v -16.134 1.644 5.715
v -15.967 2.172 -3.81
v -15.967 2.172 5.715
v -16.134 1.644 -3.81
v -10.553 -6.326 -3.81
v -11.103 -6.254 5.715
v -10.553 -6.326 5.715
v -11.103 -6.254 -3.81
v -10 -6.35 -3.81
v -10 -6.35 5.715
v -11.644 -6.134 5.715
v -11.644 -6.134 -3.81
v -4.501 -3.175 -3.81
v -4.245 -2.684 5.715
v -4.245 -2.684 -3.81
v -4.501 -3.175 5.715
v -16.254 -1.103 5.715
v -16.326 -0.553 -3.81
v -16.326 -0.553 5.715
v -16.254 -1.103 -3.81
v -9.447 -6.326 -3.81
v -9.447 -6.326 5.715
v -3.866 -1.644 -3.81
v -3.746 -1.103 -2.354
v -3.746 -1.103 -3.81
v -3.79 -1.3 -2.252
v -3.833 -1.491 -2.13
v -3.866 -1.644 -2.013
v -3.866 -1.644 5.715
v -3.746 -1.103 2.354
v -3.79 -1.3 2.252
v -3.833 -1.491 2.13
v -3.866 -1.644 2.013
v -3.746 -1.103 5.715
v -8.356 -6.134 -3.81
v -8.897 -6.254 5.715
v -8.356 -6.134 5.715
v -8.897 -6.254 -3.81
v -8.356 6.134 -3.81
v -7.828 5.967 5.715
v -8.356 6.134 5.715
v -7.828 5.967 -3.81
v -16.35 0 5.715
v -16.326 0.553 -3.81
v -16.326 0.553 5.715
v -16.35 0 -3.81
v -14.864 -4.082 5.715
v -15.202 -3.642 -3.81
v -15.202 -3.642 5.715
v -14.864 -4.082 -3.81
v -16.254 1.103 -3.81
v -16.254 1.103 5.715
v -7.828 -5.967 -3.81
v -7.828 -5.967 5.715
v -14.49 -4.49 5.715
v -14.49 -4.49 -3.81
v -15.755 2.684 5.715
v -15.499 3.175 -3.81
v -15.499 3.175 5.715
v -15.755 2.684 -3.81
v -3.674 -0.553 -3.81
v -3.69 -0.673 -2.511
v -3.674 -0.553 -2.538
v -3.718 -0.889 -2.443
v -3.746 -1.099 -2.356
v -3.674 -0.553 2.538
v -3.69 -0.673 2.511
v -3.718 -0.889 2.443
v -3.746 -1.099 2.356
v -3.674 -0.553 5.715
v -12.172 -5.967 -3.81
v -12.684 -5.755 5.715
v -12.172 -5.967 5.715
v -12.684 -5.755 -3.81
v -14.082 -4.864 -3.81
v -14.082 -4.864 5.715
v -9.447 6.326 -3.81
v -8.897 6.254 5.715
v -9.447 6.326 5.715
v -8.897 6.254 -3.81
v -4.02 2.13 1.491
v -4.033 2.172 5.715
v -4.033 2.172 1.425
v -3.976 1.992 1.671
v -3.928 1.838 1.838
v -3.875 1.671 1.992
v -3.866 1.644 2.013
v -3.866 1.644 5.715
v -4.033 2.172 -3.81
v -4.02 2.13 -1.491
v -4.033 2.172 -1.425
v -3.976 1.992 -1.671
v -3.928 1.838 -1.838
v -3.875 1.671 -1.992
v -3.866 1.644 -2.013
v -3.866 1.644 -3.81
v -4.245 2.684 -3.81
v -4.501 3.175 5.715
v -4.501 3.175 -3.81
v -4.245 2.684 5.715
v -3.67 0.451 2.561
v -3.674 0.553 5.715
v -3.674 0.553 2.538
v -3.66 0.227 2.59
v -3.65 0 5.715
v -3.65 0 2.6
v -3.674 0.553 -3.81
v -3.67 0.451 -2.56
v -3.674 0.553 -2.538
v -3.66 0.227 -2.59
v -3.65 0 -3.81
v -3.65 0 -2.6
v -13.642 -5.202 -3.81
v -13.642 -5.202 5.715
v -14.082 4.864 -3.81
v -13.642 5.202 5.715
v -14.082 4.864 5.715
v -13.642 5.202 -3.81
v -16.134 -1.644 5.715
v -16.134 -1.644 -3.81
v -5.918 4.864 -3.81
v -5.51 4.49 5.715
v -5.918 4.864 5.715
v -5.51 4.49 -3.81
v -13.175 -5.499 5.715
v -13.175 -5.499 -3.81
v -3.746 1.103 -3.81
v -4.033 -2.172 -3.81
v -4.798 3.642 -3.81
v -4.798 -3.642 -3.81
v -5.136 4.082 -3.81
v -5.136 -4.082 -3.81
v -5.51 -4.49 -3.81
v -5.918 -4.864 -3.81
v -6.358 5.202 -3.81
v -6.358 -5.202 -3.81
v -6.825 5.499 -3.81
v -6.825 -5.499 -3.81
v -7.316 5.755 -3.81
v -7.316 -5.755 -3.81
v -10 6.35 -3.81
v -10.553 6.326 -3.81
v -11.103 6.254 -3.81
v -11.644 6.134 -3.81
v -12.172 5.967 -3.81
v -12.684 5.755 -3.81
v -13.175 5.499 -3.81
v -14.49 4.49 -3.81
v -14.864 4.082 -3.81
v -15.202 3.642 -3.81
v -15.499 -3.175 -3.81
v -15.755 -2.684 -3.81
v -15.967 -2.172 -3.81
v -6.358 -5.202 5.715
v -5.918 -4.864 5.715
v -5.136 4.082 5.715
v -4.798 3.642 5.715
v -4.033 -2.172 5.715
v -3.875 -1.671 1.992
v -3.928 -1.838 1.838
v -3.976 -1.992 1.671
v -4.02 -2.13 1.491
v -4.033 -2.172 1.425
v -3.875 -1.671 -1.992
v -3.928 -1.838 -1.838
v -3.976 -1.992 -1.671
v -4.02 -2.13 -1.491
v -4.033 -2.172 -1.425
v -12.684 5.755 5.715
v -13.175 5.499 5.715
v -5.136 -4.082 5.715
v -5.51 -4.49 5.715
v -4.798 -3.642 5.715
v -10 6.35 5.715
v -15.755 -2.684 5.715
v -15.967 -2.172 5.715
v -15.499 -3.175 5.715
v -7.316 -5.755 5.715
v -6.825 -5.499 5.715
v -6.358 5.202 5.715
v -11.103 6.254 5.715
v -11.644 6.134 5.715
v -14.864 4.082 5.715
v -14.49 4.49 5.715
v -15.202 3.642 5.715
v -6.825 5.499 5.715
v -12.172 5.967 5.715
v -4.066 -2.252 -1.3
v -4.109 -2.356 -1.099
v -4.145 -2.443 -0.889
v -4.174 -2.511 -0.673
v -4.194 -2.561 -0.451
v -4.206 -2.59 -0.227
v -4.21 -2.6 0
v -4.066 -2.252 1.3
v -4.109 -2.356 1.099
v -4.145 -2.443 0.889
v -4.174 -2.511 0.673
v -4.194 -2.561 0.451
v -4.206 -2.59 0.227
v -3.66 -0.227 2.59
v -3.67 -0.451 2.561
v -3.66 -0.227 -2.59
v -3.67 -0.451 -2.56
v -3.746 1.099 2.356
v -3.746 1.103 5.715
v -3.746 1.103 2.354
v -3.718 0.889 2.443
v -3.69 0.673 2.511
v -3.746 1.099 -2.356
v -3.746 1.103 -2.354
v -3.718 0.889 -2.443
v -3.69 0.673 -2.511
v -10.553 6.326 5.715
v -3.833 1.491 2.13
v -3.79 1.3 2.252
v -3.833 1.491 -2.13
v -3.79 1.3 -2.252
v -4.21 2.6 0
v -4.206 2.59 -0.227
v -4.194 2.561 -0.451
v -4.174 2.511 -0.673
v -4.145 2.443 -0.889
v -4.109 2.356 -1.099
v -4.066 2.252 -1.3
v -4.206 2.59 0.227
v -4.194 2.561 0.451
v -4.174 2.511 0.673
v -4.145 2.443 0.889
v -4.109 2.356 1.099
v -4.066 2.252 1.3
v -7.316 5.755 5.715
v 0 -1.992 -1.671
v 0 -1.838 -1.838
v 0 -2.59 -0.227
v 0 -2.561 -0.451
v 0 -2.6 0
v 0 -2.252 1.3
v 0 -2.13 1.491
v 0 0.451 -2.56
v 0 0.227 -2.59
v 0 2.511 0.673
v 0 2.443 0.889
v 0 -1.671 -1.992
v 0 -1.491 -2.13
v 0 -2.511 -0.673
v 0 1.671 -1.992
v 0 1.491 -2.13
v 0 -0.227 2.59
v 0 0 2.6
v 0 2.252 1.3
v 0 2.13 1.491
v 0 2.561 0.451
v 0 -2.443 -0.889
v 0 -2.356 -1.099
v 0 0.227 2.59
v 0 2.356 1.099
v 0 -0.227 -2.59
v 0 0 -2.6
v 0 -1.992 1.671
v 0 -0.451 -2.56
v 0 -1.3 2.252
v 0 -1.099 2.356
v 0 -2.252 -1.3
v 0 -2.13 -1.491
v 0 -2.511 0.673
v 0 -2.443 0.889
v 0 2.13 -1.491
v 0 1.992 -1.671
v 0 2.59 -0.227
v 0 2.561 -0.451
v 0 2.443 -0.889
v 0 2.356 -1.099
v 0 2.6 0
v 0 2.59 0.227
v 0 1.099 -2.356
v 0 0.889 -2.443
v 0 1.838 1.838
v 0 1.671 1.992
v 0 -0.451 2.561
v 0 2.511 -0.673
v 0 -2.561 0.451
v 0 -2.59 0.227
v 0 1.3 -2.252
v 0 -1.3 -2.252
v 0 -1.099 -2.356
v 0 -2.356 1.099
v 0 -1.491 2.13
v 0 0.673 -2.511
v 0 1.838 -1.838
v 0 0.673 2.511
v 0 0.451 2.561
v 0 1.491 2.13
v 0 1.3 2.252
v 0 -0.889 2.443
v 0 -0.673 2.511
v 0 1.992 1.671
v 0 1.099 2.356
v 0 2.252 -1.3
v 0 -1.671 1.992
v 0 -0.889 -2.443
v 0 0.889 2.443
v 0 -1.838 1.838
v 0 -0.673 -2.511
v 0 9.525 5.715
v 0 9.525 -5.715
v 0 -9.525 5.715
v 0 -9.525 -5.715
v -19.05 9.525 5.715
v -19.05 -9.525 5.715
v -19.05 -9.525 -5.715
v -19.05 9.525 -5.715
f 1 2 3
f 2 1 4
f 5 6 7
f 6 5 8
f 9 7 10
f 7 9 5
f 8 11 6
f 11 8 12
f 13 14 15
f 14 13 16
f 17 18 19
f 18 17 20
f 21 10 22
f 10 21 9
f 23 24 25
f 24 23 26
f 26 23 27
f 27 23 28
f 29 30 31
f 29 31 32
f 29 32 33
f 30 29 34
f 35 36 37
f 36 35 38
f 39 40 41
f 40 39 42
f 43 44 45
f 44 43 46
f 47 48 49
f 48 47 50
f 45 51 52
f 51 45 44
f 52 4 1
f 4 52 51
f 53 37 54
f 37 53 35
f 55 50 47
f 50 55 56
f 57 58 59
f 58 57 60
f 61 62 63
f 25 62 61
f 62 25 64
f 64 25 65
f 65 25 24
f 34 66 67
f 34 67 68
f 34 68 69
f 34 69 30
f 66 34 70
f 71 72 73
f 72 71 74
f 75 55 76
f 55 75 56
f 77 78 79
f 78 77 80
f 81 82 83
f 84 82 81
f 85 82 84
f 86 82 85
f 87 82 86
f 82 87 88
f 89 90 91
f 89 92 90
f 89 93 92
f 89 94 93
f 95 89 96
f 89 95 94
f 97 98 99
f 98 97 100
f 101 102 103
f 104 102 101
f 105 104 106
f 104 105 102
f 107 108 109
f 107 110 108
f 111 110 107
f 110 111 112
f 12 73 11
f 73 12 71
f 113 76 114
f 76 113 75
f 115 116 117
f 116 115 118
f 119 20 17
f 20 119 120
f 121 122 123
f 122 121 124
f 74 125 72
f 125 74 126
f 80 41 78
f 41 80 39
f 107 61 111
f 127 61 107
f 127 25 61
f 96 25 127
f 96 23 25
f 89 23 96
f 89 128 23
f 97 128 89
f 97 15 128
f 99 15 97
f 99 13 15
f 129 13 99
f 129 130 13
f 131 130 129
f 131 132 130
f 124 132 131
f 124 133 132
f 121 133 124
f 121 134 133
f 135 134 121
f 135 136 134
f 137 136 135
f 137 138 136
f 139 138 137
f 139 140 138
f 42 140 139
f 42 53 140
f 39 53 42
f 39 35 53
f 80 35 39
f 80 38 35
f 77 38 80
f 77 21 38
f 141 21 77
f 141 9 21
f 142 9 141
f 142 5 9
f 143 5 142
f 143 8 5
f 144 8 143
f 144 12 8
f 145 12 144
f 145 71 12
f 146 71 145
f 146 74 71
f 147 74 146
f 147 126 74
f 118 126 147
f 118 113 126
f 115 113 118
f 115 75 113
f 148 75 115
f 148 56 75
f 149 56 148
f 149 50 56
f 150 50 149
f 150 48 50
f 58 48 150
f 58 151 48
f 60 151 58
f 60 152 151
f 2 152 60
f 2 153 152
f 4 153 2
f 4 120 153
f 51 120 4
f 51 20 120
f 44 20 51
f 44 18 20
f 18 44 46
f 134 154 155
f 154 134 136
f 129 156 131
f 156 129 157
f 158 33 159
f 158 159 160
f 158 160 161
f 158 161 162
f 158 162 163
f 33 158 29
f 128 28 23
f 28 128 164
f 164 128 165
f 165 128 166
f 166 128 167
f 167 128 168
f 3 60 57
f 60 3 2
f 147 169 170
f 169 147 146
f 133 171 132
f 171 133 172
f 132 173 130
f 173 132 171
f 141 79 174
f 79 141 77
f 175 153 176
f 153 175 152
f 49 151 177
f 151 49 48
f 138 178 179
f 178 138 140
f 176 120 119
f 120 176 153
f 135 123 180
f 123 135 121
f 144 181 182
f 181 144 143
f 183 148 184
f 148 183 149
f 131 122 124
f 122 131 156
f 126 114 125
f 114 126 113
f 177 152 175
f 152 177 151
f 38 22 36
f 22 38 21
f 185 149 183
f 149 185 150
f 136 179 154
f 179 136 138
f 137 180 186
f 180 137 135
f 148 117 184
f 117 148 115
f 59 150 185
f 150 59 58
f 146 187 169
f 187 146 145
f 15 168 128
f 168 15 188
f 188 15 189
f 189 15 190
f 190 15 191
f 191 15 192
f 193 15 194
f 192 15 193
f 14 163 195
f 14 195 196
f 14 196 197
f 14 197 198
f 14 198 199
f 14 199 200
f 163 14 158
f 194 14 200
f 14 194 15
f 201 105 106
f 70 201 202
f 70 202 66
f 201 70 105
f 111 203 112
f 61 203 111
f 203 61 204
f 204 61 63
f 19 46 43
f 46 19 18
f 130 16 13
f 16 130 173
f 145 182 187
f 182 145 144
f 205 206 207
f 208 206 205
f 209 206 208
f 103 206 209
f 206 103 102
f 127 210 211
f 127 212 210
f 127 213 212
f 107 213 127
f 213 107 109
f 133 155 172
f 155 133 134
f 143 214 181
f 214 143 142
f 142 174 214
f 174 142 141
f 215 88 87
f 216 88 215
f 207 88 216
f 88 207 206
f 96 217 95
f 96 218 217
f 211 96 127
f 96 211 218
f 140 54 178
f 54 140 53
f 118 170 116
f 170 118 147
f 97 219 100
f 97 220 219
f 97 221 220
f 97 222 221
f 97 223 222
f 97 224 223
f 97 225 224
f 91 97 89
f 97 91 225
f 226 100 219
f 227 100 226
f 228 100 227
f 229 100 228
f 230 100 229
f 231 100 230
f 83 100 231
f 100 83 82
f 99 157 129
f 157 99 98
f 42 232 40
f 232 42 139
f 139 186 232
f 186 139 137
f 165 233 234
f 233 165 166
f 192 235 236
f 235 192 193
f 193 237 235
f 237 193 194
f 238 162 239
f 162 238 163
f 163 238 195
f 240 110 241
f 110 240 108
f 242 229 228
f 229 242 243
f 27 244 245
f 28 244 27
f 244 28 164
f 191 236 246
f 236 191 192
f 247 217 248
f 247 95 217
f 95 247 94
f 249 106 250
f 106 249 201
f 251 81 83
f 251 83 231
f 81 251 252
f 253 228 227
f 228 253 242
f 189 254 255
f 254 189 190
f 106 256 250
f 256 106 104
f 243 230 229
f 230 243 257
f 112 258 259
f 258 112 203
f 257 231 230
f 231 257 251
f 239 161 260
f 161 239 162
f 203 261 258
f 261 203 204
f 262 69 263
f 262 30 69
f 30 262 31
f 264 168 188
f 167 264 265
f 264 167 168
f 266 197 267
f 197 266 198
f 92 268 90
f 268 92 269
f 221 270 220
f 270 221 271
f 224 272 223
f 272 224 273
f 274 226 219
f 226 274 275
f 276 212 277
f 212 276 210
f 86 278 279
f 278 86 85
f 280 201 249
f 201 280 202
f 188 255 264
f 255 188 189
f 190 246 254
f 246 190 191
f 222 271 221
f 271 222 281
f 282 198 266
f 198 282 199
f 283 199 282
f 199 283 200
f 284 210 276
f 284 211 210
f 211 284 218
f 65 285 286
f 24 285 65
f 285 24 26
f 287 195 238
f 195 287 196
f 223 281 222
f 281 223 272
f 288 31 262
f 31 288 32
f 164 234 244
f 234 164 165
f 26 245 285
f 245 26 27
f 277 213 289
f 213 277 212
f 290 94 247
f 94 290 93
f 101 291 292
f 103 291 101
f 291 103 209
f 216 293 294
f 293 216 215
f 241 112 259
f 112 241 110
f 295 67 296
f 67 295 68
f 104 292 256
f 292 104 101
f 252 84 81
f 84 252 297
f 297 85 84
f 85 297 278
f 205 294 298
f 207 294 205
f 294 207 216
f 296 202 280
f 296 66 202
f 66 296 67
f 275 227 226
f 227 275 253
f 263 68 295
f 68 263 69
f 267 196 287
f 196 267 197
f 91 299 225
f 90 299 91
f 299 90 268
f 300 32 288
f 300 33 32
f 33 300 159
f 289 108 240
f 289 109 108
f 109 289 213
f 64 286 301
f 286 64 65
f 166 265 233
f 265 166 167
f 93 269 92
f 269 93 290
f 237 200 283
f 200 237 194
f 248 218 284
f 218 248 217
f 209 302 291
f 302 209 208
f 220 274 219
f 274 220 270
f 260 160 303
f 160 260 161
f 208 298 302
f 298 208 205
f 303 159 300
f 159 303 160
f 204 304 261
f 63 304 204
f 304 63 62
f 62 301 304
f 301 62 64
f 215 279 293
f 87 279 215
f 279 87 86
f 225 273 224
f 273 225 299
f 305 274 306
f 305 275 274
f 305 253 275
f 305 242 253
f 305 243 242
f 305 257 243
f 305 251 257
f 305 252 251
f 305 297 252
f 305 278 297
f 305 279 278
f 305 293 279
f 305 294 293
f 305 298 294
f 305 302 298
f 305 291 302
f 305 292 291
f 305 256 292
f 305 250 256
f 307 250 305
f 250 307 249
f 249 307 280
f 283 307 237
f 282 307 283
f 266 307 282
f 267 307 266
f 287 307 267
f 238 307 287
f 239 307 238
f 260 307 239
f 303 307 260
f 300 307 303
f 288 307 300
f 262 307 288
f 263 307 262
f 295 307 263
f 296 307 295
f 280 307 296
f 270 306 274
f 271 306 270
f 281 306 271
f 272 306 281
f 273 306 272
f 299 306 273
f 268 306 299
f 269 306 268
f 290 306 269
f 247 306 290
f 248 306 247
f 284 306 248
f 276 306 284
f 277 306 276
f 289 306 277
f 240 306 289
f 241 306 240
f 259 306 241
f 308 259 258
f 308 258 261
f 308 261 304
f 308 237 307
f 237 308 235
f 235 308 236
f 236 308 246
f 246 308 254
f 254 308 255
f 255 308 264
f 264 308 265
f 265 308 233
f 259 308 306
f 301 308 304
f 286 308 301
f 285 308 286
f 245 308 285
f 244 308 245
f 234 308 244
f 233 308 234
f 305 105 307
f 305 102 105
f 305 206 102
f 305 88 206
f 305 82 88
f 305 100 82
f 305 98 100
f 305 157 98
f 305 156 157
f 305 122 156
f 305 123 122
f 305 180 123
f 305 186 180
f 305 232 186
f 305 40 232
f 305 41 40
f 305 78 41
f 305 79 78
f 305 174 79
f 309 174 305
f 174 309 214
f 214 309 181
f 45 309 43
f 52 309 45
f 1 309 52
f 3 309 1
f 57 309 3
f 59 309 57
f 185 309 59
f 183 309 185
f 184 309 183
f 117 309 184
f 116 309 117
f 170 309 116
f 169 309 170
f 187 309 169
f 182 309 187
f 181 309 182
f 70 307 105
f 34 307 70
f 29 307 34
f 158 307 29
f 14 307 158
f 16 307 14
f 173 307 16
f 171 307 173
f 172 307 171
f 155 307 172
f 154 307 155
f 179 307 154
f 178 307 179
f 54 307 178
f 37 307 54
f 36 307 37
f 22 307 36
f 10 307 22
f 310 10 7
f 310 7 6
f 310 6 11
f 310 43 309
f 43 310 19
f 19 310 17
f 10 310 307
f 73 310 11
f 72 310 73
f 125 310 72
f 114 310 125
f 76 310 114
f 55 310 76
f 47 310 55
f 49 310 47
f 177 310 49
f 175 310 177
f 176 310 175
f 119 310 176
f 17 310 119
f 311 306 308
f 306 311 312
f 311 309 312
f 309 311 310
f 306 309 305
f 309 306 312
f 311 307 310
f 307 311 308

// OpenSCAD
// file: shared.scad
panelDegrees = 35; // https://rimstar.org/science_electronics_projects/bb-8_dimensions.htm
panelRadius = radius * sin(panelDegrees);
insertionTolerance = 0.3;

if (camlockBoltRadius * 2 + 2 > camlockNutThickness)
    warn("Camlock Bolt/Nut sizes invalid");

panelRadiusOffset = radius * cos(panelDegrees);

module bodySphere() {
    difference() {
        sphere(radius, $fn=$fnBody);
        sphere(radius - wallThickness, $fn=$fn);
    };
}

module tFrame() {
    difference() {
        bodySphere();

        rotate([90, 0, 0])
        cylinder(r1=panelRadius, r2=panelRadius, h=radius * 2, center=true);
        rotate([0, 90, 0])
        cylinder(r1=panelRadius, r2=panelRadius, h=radius * 2, center=true);
        cylinder(r1=panelRadius, r2=panelRadius, h=radius * 2, center=true);
    }
}

module tFrameThird() {
    camlockOffset = 42.5;
    rotationDifference = 30.5;
    difference() {
        intersection() {
            polyhedron(
            points=[ [radius,radius,radius],[2*radius,0,0],[0,2*radius,0], // the three points at base
                    [0,0,0]  ],                                 // the apex point
            faces=[ [0,1,3],[1,2,3],
                        [2,0,3],[2,1,0] ]
            );

            tFrame();
        }

        rotate([0,-90,40])
        translate([0,0,-(radius - wallThickness - 0)])
        rotate([0,0,90])
        camLockSlot(boltLength=camlockBoltLength);

        rotate([0,-90,50])
        translate([0,0,-(radius - wallThickness - 0)])
        rotate([0,0,90])
        camLockSlot(boltLength=camlockBoltLength);

        rotate(a=-camlockOffset, v=[-1,0,1])
        rotate([0,-90,90])
        translate([0,0,-(radius - wallThickness - 0)])
        rotate([0,0,-45 + rotationDifference]) // bolt rotation
        camLockSlot(boltLength=camlockBoltLength);

        rotate(a=-camlockOffset, v=[-1,0,1])
        rotate([0,-90,90])
        translate([0,0,-(radius - wallThickness - 0)])
        rotate([0,0,-45 - rotationDifference]) // bolt rotation
        camLockSlot(boltLength=camlockBoltLength);

        rotate(a=camlockOffset, v=[0,-1,1])
        rotate([0,-90,0])
        translate([0,0,-(radius - wallThickness - 0)])
        rotate([0,0,-135 + rotationDifference]) // bolt rotation
        camLockSlot(boltLength=camlockBoltLength);

        rotate(a=camlockOffset, v=[0,-1,1])
        rotate([0,-90,0])
        translate([0,0,-(radius - wallThickness - 0)])
        rotate([0,0,-135 - rotationDifference]) // bolt rotation
        camLockSlot(boltLength=camlockBoltLength);
    }
}

module camLockSlot(boltLength = 50) {
    translate([0,-boltLength/2,0])
    rotate([180, 0, 0])
    union() {
        translate([0,0,-camlockNutMaxDepth])
        cylinder(r1=camlockNutRadius, r2=camlockNutRadius, h=camlockNutThickness + camlockNutMaxDepth, $fn=$fn);

        rotate([90,0,0])
        translate([0, camlockNutThickness * 0.5, 0])
        cylinder(r1=camlockBoltRadius, r2=camlockBoltRadius, h=boltLength);
    }
}

module camlockBolt(boltLength = camlockBoltLength) {
    endcapLength = camlockNutRadius - fittedTolerance * 2 - camlockNutWallThickness;
    endcapOffsetLength = camlockNutRadius + fittedTolerance;
    boltRadius = camlockBoltRadius - insertionTolerance / 2;
    endcapConnectorRadius = boltRadius - camlockNutGripSize;
    bezel = endcapLength * 0.25;
    echo(endcapLength);

    cylinder(r1=endcapConnectorRadius, r2=endcapConnectorRadius, h=boltLength);

    translate([0, 0, endcapOffsetLength + bezel])
    cylinder(r1=boltRadius, r2=boltRadius, h=boltLength - endcapOffsetLength * 2 - bezel * 2);
    translate([0, 0, endcapOffsetLength])
    cylinder(r1=endcapConnectorRadius, r2=boltRadius, h=bezel);
    translate([0, 0, boltLength - endcapOffsetLength - bezel])
    cylinder(r1=boltRadius, r2=endcapConnectorRadius, h=bezel);

    cylinder(r1=boltRadius, r2=boltRadius, h=endcapLength-bezel);
    translate([0, 0, endcapLength - bezel])
    cylinder(r1=boltRadius, r2=endcapConnectorRadius, h=bezel);

    translate([0, 0, boltLength - endcapLength + bezel])
    cylinder(r1=boltRadius, r2=boltRadius, h=endcapLength-bezel);
    translate([0, 0, boltLength - endcapLength])
    cylinder(r1=endcapConnectorRadius, r2=boltRadius, h=bezel);
}

module camlockNut() {
    camlockRadius = camlockNutRadius - fittedTolerance;
    camlockInnerRadius = camlockNutRadius - fittedTolerance - camlockNutWallThickness;
    endcapOpeningRadius = camlockBoltRadius - camlockNutGripSize;

    difference() {
        translate([0,0,insertionTolerance])
        cylinder(r1=camlockRadius, r2=camlockRadius, h=camlockNutThickness, center=true);

        /*intersection() {
            rotate([0,0,-90])
            translate([-camlockBoltRadius,-camlockBoltRadius,-camlockNutThickness / 2])
            cube([camlockRadius * 2, camlockRadius * 2, camlockNutThickness]);

            cylinder(r1=camlockInnerRadius, r2=camlockInnerRadius, h=camlockBoltRadius * 2, center=true);
        }*/

        intersection() {
            union() {
                translate([camlockRadius - camlockInnerRadius, 0, - camlockNutThickness / 2 + camlockBoltRadius])
                cylinder(r1=camlockInnerRadius, r2=camlockInnerRadius, h=camlockNutThickness, center=true);
                cylinder(r1=camlockRadius + 5, r2=camlockRadius + 5, h=endcapOpeningRadius * 2, center=true);
            }
            union() {
                rotate([0,0,-90])
                translate([-camlockBoltRadius,-camlockRadius,-camlockNutThickness / 2])
                cube([camlockRadius * 2, camlockRadius * 2, camlockNutThickness]);

                translate([camlockRadius - camlockInnerRadius * 2 + 2, 0, 0])
                rotate([0, 90, 0])
                cylinder(r1=camlockBoltRadius, r2=camlockBoltRadius, h=camlockNutRadius + camlockInnerRadius *2);
            }
        }
        // side bolt-hole
        rotate([0, 90, 0])
        cylinder(r1=camlockBoltRadius, r2=camlockBoltRadius, h=camlockNutRadius + camlockInnerRadius *2);

        // bottom bolt-hole
        translate([camlockRadius - 1.5, 0, -camlockNutThickness])
        cube([camlockRadius * 2, camlockBoltRadius * 2, camlockNutThickness * 2], center = true);

        // rotate slot for cap opening
        rotate([0, -90, 0])
        cylinder(r1=endcapOpeningRadius, r2=endcapOpeningRadius, h=camlockNutRadius);

        // screwdriver slot
        translate([0, 0, camlockNutThickness - 0.6 + insertionTolerance])
        cube([camlockRadius * 3, 1.2, camlockNutThickness], center=true);
    }
}

module warn(text)
{
    echo(str("<span style='background-color: #ffffb0'>", text, "</span>"));
}
// main file
$fnBody = 360 / 3;
$fn = 360/5;
millisPerInch = 25.4;
radius = 253;
wallThickness = 0.5 * millisPerInch;
camlockNutRadius = 0.25 * millisPerInch;
camlockNutThickness = wallThickness * 0.6;
camlockNutWallThickness = 1.6;
camlockNutMaxDepth = 10;
camlockNutGripSize = 1;
camlockBoltRadius = 2.6;
camlockBoltLength = 40;
fittedTolerance = 0.5;

include <shared.scad>;

%union() {
    translate([-camlockNutRadius*1.5-insertionTolerance,0,0])
    rotate([0, 90, 0])
    camlockBolt(20);

    translate([-camlockNutRadius*1.5-insertionTolerance,0,0])
    camlockNut();
}

difference() {
    translate([-camlockNutRadius*1.5,0,0])
    cube([camlockNutRadius*3,camlockNutRadius*3,camlockNutThickness*1.5], center=true);

    translate([0,0,camlockNutThickness * 0.5])
    rotate([0, 0, -90])
    camLockSlot(20);
}
